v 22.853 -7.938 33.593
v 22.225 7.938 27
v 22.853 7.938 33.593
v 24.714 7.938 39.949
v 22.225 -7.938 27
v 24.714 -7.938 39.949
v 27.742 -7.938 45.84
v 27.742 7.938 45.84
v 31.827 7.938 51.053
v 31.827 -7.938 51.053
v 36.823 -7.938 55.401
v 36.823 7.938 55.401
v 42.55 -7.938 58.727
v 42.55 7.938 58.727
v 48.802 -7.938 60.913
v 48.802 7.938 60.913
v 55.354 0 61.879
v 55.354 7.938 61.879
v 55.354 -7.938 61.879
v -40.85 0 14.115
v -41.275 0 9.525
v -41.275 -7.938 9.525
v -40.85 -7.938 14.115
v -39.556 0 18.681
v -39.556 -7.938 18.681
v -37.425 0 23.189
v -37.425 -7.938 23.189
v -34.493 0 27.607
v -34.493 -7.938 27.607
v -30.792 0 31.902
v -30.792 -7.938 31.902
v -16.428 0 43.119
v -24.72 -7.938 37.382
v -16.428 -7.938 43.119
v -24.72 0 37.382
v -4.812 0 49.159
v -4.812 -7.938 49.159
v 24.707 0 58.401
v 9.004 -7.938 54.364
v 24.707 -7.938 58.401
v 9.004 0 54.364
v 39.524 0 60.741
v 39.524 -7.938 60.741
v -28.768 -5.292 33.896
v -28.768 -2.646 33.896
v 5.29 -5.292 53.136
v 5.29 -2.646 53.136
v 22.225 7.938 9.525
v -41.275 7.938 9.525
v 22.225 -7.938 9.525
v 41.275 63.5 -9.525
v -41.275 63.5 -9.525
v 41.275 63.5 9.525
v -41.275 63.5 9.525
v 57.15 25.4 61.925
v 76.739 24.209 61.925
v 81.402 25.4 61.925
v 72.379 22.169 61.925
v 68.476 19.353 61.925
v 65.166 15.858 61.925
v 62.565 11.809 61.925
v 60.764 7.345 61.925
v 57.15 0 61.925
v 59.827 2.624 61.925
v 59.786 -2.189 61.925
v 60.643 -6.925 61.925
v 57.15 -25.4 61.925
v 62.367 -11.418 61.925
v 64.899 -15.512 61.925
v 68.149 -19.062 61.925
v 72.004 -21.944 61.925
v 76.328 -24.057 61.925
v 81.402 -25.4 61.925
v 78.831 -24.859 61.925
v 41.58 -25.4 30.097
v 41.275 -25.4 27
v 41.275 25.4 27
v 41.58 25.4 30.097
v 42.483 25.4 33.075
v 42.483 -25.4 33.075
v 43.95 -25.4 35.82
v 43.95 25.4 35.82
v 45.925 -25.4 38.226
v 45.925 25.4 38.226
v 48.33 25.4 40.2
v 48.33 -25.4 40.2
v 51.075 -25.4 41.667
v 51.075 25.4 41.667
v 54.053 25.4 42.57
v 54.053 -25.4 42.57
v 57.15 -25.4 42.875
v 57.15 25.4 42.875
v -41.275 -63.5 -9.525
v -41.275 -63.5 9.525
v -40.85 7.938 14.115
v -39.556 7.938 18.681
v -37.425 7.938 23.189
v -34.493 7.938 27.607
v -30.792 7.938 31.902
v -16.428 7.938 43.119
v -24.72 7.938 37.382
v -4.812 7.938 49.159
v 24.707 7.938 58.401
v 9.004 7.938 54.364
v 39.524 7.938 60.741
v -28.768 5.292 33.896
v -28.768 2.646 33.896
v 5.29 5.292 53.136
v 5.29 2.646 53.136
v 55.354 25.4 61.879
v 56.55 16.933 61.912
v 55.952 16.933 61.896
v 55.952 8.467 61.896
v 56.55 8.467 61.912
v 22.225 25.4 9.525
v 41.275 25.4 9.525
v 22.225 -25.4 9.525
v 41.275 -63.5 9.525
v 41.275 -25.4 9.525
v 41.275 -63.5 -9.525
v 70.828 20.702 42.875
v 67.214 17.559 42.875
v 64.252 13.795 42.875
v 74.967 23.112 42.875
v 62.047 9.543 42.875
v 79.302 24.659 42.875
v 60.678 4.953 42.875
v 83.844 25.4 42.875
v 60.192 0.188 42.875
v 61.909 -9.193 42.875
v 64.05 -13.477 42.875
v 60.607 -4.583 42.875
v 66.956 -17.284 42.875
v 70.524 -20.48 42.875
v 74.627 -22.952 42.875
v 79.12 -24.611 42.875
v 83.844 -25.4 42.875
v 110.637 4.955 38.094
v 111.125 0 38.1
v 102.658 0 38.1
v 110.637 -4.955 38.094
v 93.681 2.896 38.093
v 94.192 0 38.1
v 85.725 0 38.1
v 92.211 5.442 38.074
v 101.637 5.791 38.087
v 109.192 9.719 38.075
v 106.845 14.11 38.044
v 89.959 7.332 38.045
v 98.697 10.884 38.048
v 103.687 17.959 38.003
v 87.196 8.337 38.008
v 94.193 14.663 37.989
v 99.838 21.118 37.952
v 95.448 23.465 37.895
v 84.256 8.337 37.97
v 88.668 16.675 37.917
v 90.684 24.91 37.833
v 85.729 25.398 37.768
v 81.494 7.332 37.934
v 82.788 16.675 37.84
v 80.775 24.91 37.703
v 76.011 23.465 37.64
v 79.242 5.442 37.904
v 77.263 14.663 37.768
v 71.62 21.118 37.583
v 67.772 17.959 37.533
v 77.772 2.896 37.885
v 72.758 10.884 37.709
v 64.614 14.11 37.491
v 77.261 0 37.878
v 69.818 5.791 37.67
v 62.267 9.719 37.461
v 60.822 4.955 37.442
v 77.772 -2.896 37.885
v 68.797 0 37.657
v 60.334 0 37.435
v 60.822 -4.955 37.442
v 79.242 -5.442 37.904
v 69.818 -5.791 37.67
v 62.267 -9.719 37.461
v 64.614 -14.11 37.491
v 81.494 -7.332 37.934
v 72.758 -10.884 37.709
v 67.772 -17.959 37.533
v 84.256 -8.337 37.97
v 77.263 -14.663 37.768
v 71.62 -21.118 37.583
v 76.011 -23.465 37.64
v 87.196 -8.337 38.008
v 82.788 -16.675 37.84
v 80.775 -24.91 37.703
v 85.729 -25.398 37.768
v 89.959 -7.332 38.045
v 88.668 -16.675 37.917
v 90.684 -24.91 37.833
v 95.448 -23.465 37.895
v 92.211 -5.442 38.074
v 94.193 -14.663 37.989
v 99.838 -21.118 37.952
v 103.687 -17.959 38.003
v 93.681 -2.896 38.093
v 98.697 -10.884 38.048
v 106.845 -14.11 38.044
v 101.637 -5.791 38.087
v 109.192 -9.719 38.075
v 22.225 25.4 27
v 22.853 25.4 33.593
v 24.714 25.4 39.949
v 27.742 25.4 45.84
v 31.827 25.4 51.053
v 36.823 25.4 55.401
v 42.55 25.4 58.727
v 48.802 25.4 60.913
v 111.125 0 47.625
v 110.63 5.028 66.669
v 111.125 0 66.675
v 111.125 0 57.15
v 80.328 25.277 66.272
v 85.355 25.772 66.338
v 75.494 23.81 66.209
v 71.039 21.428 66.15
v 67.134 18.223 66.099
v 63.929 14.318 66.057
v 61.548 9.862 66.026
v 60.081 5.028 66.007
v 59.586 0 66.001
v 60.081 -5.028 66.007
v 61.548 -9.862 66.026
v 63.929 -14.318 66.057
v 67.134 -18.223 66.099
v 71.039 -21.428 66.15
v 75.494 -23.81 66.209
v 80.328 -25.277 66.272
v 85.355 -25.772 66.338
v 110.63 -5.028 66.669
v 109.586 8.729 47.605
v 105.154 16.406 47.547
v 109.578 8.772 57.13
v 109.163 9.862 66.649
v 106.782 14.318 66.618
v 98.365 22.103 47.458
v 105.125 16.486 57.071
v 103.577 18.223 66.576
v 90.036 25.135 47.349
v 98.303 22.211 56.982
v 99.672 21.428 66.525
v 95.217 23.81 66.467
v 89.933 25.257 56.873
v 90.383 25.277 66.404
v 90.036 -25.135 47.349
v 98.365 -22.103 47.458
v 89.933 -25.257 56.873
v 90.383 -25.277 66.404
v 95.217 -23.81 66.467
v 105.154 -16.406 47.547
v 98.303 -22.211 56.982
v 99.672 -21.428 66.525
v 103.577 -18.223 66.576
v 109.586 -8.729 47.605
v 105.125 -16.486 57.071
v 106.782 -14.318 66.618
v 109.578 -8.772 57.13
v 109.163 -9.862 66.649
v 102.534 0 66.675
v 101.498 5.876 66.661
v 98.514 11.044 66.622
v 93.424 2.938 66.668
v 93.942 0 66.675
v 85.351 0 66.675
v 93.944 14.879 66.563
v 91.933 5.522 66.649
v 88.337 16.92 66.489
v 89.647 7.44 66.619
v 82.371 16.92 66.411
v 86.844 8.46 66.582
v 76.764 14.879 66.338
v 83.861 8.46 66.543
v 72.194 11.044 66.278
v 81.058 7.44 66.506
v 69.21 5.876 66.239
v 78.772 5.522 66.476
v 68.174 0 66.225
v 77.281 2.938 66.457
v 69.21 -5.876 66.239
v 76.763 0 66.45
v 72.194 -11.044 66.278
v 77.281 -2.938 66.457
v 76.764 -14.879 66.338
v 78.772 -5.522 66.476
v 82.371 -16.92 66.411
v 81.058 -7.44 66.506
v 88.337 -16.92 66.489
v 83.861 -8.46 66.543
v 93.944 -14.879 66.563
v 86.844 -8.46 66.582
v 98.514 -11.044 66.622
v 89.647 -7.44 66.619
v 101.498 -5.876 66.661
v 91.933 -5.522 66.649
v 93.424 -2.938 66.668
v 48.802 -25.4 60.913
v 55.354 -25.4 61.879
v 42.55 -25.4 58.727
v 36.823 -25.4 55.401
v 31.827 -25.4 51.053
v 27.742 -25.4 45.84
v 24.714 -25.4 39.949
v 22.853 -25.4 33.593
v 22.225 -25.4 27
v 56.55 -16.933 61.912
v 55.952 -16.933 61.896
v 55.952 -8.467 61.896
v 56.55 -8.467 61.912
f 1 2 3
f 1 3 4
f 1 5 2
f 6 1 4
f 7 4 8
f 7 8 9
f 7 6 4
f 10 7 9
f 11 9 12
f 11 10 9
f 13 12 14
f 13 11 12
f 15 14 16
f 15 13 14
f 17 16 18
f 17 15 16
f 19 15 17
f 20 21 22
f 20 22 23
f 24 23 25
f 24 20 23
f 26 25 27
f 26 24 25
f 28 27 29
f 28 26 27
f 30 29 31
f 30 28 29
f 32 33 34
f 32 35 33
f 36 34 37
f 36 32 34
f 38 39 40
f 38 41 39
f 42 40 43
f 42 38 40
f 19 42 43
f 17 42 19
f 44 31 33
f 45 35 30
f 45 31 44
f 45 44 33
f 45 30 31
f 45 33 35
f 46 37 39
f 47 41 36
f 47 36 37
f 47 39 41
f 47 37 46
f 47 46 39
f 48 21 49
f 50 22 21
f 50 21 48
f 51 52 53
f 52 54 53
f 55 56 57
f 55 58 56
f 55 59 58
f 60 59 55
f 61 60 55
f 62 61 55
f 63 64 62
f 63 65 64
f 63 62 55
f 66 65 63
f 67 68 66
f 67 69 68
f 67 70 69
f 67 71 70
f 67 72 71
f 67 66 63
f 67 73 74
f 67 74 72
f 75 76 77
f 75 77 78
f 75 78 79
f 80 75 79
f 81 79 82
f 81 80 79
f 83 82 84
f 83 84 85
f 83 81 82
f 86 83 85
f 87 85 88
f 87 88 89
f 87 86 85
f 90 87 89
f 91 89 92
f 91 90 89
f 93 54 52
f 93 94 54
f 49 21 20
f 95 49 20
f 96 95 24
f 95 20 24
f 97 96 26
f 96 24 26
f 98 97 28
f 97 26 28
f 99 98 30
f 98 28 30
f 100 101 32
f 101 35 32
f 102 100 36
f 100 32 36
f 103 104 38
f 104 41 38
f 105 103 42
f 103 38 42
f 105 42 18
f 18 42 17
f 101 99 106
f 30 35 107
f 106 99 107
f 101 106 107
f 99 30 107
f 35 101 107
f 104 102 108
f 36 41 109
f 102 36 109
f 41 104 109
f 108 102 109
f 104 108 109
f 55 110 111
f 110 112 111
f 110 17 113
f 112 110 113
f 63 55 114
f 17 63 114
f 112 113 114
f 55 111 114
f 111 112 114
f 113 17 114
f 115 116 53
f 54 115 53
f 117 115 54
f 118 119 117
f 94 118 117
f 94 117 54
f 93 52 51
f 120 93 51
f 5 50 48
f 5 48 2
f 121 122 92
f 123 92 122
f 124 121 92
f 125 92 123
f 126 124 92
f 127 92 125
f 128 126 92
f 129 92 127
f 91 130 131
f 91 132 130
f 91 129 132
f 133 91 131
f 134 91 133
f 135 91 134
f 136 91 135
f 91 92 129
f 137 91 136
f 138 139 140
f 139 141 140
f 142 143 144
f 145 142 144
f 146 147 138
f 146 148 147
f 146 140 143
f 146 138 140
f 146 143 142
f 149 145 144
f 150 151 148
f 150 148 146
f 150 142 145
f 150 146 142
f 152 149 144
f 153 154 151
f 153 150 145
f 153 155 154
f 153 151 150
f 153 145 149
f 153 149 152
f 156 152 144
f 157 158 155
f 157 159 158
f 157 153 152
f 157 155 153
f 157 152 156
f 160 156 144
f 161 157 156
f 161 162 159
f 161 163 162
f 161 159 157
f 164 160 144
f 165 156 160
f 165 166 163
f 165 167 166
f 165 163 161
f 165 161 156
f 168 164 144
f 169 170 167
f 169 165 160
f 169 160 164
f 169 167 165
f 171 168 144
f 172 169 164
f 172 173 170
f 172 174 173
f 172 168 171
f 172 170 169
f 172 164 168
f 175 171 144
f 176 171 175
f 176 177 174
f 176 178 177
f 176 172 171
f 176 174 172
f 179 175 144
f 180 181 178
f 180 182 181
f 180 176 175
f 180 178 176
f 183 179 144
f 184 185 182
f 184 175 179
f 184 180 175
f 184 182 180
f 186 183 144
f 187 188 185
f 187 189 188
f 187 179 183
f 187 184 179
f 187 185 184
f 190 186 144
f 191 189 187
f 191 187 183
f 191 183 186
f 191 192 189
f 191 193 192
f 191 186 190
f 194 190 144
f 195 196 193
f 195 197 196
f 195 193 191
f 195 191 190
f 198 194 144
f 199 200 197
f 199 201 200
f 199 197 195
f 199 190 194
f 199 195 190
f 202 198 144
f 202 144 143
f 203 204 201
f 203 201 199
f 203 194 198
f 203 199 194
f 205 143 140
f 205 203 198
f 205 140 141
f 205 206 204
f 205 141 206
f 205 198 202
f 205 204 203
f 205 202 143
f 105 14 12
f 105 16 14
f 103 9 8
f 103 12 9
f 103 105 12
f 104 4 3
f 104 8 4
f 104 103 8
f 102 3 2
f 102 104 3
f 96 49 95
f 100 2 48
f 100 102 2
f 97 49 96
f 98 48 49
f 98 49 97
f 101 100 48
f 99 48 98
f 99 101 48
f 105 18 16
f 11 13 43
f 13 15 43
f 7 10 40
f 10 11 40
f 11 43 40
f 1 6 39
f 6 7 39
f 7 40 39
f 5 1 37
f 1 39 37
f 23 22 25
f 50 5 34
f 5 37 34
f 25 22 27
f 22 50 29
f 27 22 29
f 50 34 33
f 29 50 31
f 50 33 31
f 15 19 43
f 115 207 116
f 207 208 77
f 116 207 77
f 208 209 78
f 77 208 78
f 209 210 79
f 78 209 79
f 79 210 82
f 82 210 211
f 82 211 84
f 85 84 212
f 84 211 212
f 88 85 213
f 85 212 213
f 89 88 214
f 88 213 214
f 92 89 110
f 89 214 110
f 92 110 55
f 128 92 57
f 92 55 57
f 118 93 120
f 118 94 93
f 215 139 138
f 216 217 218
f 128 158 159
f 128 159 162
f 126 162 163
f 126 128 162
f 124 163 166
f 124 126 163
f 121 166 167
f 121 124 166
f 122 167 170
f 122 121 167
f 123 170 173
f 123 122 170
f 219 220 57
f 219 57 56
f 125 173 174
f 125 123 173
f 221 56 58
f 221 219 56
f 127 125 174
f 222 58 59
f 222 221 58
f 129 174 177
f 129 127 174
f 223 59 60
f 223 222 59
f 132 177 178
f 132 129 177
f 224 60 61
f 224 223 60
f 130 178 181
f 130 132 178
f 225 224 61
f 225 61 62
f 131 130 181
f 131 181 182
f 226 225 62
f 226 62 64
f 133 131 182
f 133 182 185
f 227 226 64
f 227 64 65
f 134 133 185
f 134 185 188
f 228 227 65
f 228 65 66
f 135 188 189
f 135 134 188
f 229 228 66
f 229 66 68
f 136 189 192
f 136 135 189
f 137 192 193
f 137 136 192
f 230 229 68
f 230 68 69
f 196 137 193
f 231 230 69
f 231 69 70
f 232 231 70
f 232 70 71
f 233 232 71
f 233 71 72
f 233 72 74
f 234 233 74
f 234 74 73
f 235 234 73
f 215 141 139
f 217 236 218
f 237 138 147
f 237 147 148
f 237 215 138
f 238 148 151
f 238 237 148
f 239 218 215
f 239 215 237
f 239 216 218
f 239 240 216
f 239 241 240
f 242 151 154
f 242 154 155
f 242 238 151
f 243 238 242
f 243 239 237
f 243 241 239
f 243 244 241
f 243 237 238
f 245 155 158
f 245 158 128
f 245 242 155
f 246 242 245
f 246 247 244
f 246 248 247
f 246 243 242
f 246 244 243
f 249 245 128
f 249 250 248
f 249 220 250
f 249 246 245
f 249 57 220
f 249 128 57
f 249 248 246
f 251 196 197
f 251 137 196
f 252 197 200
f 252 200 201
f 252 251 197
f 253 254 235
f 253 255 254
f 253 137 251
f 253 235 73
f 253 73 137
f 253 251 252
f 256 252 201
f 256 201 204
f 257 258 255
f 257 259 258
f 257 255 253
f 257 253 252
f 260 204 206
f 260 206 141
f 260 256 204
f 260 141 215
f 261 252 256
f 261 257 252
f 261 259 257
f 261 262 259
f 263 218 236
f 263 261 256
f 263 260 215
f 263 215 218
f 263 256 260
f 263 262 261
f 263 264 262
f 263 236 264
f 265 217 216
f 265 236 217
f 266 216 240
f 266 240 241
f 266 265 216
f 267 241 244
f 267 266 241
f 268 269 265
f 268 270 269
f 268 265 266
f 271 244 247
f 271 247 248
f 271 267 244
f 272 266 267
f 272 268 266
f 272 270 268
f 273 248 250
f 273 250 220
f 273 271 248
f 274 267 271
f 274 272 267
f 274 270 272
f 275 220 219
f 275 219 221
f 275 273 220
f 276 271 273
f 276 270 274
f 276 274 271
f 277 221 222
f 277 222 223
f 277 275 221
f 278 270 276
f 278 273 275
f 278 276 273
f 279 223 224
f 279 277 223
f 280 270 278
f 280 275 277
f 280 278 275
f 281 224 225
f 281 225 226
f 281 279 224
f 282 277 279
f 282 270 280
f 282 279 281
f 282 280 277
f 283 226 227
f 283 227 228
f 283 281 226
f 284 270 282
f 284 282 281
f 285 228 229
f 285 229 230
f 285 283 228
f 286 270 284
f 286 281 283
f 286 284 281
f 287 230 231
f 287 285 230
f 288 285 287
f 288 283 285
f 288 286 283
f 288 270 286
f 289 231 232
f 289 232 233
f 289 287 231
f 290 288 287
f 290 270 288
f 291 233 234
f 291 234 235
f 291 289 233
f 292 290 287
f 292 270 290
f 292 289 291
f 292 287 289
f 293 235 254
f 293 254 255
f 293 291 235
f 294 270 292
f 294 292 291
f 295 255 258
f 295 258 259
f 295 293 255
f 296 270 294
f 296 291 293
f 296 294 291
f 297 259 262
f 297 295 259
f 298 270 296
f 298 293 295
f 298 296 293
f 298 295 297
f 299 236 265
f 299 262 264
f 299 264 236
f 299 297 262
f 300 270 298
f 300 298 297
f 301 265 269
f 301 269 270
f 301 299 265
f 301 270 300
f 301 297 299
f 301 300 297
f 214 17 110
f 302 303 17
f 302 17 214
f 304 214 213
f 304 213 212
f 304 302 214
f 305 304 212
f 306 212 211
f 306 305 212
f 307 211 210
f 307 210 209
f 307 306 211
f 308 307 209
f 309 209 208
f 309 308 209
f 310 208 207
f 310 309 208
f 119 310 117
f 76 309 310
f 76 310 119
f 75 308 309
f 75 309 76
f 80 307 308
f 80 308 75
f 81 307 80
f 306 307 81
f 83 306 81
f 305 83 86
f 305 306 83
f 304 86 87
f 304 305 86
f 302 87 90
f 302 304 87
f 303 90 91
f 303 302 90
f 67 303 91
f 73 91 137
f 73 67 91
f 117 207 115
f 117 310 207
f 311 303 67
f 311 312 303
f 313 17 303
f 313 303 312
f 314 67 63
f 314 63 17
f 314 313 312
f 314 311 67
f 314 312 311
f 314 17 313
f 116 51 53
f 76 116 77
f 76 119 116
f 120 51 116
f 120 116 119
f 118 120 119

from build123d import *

# Parameters (mm, degrees)
F1_DEPTH = 63.5
F0_W     = 3.175
F0_H     = 19.05
F0_W_2   = 25.0260655152
F2_DEPTH = 25.4
F3_DEPTH = 7.9375


with BuildPart() as f1:
    # F0 (on Front) → F1 (new body, symmetric)
    with BuildSketch(Plane.XZ):
        Polygon((-41.275, -9.525), (41.275, -9.525), (41.275, 9.525), (22.225, 9.525), (-41.275, 9.525), align=None)
    extrude(amount=F1_DEPTH, both=True)

    # F0 (on Front) → F2 (join, symmetric)
    with BuildSketch(Plane.XZ):
        with BuildLine():
            Line((22.225, 9.525), (41.275, 9.525))
            Line((41.275, 9.525), (41.275, 27.0002))
            ThreePointArc((41.275, 27.0002), (45.9246798487, 38.2255201513), (57.15, 42.8752))
            Line((57.15, 42.8752), (57.15, 61.9252))
            add(Edge.make_bspline(
                [(55.3542016854, 61.8790006304), (55.9510424401, 61.8970923773), (56.5496518298, 61.9125018017), (57.15, 61.9252)],
                knots=[110.3332055553, 110.3332055553, 110.3332055553, 110.3332055553, 111.5045361635, 111.5045361635, 111.5045361635, 111.5045361635], degree=3))
            ThreePointArc((55.3542016854, 61.8790006304), (31.8273433351, 51.0526153555), (22.225, 27.0002))
            Line((22.225, 27.0002), (22.225, 9.525))
        make_face()
        with Locations((58.7375, 52.4002)):
            Rectangle(F0_W, F0_H)
        with Locations((72.8380327576, 52.4002)):
            Rectangle(F0_W_2, F0_H)
    extrude(amount=F2_DEPTH, both=True)

    # F0 (on Front) → F4 (revolve)
    with BuildSketch(Plane.XZ):
        Polygon((85.3510655152, 66.675), (85.725, 38.1), (111.125, 38.1), (111.125, 66.675), align=None)
    revolve(axis=Axis((85.5380327576, 0, 52.3875), (-0.0130849509, 0, 0.9999143884)))


with BuildPart() as f3:
    # F0 (on Front) → F3 (new body, symmetric)
    with BuildSketch(Plane.XZ):
        with BuildLine():
            add(Edge.make_bspline(
                [(-41.275, 9.525), (-41.3918569019, 34.6713886687), (-0.8650699785, 60.1748528703), (55.3542016854, 61.8790006304)],
                knots=[0, 0, 0, 0, 110.3332055553, 110.3332055553, 110.3332055553, 110.3332055553], degree=3))
            Line((-41.275, 9.525), (22.225, 9.525))
            Line((22.225, 9.525), (22.225, 27.0002))
            ThreePointArc((22.225, 27.0002), (31.8273433351, 51.0526153555), (55.3542016854, 61.8790006304))
        make_face()
    extrude(amount=F3_DEPTH, both=True)


solid = Compound([f1.part, f3.part])
